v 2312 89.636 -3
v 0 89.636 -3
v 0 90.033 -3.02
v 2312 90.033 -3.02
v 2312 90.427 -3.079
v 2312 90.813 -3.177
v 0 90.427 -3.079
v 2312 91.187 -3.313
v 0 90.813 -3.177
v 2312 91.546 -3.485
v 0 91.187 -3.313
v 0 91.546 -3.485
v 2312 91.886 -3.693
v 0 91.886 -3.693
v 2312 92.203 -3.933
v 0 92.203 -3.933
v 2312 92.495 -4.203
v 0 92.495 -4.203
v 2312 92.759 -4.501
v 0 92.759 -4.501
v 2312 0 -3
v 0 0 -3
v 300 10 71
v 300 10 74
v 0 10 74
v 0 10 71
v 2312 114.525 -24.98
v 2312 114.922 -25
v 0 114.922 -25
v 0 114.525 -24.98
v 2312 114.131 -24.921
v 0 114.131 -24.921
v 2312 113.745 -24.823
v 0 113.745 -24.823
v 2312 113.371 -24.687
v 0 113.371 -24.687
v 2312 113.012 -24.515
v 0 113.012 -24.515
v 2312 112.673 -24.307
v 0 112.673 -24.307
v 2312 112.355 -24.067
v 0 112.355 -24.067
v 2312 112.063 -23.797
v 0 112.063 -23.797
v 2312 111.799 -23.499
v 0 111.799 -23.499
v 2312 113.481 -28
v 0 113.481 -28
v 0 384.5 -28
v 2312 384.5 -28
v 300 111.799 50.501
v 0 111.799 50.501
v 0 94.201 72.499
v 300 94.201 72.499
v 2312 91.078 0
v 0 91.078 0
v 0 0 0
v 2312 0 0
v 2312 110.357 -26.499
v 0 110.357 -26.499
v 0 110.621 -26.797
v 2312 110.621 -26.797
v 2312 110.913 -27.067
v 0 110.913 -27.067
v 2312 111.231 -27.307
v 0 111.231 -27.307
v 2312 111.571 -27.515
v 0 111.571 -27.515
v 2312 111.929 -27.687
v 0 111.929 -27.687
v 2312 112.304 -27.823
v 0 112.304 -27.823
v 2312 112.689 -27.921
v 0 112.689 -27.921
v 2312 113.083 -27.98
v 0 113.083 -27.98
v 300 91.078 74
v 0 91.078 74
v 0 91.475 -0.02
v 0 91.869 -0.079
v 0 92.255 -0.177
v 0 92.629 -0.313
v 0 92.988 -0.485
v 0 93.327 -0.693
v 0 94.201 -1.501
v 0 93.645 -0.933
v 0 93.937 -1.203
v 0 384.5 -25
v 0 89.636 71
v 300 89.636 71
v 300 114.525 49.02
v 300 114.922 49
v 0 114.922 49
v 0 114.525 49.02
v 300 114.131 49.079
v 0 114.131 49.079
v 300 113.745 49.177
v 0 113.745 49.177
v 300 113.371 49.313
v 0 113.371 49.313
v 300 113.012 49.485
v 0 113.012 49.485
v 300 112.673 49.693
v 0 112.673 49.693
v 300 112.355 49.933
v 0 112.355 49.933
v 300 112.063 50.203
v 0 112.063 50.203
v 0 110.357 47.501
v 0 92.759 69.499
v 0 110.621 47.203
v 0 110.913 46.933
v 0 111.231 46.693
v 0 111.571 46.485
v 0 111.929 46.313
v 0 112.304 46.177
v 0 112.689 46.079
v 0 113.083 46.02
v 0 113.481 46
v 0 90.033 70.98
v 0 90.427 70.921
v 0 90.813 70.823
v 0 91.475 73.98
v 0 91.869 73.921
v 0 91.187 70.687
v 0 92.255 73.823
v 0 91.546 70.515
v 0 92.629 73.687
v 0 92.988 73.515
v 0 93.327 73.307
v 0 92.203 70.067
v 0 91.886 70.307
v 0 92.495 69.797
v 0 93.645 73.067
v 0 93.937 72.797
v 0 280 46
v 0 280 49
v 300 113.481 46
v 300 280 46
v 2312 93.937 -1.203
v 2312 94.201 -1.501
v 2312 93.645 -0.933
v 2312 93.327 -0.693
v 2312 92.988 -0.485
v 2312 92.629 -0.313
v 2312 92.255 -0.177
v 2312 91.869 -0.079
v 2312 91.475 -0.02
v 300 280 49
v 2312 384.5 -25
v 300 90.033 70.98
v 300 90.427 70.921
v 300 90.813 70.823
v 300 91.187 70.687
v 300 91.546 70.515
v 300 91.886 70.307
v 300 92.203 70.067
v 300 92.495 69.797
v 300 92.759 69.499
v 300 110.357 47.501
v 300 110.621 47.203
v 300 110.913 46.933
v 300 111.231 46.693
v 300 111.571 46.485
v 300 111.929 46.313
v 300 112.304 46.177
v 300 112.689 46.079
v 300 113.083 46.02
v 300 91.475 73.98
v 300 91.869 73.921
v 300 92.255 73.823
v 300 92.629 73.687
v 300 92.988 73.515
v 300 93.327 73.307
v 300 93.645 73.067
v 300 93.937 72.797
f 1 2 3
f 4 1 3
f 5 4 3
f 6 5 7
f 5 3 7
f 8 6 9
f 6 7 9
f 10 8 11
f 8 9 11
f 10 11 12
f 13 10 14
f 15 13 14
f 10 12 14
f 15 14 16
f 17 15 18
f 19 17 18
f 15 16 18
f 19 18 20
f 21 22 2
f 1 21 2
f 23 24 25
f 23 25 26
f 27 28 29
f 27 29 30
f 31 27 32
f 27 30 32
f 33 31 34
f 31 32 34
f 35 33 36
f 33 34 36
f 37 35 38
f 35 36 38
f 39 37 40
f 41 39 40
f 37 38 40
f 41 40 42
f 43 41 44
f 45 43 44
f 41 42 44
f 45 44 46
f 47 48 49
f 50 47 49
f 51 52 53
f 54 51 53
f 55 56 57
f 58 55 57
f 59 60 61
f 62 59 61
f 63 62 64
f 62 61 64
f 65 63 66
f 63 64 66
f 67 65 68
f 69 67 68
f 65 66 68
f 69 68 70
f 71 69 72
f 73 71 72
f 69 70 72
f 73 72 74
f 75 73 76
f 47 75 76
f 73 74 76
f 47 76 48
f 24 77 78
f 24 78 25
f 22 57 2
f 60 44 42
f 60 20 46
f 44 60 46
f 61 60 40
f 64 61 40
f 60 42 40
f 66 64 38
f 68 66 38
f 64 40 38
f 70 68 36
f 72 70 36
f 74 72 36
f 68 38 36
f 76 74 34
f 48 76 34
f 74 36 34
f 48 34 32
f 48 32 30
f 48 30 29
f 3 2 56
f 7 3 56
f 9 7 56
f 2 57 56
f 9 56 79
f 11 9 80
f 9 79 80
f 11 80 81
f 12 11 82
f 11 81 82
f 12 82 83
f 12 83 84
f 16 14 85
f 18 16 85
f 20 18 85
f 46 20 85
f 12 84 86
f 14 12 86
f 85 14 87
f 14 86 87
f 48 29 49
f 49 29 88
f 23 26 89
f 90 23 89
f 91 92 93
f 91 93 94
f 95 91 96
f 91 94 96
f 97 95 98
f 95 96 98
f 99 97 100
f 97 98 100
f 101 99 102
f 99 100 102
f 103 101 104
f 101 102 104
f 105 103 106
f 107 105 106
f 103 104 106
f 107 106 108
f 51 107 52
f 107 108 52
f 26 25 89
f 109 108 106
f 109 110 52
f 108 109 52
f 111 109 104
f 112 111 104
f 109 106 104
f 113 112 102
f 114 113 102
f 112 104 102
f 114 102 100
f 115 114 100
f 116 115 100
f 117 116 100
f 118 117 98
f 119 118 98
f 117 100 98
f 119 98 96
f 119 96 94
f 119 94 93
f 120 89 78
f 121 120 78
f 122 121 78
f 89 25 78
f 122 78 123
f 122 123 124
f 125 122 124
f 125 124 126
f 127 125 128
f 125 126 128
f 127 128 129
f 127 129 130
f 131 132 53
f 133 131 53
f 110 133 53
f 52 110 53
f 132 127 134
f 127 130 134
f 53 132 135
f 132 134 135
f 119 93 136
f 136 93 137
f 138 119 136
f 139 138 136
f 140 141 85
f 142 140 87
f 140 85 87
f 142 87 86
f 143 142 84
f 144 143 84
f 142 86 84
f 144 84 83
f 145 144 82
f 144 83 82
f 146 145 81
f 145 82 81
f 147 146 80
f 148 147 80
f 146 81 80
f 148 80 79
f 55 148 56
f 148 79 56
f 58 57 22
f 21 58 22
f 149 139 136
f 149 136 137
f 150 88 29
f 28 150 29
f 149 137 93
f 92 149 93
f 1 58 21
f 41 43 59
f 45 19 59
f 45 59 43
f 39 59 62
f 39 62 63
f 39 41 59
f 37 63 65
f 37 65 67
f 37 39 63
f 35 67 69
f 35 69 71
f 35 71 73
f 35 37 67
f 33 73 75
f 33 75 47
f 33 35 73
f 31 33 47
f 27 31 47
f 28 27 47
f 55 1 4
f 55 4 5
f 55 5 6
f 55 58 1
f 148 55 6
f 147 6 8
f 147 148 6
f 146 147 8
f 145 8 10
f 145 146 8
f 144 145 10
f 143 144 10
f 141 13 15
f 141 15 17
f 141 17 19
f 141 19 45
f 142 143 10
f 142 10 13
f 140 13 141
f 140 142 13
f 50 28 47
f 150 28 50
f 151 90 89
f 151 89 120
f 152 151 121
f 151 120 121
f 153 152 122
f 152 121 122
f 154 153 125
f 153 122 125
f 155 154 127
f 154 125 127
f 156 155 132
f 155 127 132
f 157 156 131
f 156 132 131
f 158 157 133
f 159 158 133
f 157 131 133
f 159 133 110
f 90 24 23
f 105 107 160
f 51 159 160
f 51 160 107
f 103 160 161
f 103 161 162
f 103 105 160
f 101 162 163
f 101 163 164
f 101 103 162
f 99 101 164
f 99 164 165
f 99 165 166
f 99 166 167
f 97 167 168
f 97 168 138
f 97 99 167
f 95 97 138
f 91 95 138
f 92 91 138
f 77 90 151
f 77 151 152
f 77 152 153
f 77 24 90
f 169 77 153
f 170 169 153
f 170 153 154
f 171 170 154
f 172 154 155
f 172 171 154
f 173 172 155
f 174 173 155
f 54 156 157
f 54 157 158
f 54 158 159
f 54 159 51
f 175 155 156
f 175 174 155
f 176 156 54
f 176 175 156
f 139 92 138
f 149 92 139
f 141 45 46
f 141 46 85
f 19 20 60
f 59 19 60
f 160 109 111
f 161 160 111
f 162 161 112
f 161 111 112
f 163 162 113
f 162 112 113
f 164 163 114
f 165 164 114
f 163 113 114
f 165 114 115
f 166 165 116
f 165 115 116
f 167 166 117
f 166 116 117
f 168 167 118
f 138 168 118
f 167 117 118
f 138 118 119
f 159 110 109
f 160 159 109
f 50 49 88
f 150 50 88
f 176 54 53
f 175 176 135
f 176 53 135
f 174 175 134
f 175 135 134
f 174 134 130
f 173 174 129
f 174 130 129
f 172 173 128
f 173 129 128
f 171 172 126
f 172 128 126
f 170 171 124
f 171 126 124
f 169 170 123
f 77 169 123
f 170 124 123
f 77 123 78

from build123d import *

# Parameters (mm, degrees)
F1_DEPTH = 2312
F3_DEPTH = 300


with BuildPart() as f1:
    # F0 (on Right) → F1 (new body)
    with BuildSketch(Plane.YZ):
        with BuildLine():
            Line((91.077501, 0), (0, 0))
            Line((0, 0), (0, -3))
            Line((0, -3), (89.635626, -3))
            ThreePointArc((89.635626, -3), (91.368381, -3.394787), (92.759101, -4.50122))
            Line((92.759101, -4.50122), (110.35715, -26.49878))
            ThreePointArc((110.35715, -26.49878), (111.74787, -27.605213), (113.480625, -28))
            Line((113.480625, -28), (384.5, -28))
            Line((384.5, -28), (384.5, -25))
            Line((384.5, -25), (114.922499, -25))
            ThreePointArc((114.922499, -25), (113.189744, -24.605213), (111.799024, -23.49878))
            Line((111.799024, -23.49878), (94.200976, -1.50122))
            ThreePointArc((94.200976, -1.50122), (92.810256, -0.394787), (91.077501, 0))
        make_face()
    extrude(amount=F1_DEPTH)


with BuildPart() as f3:
    # F2 (on Right) → F3 (new body)
    with BuildSketch(Plane.YZ):
        with BuildLine():
            Line((91.077501, 74.000002), (10, 74.000002))
            Line((10, 74.000002), (10, 71.000002))
            Line((10, 71.000002), (89.635626, 71.000002))
            ThreePointArc((89.635626, 71.000002), (91.368381, 70.605215), (92.759101, 69.498783))
            Line((92.759101, 69.498783), (110.35715, 47.501222))
            ThreePointArc((110.35715, 47.501222), (111.74787, 46.394789), (113.480625, 46.000002))
            Line((113.480625, 46.000002), (280, 46.000002))
            Line((280, 46.000002), (280, 49.000002))
            Line((280, 49.000002), (114.922499, 49.000002))
            ThreePointArc((114.922499, 49.000002), (113.189744, 49.394789), (111.799024, 50.501222))
            Line((111.799024, 50.501222), (94.200976, 72.498783))
            ThreePointArc((94.200976, 72.498783), (92.810256, 73.605215), (91.077501, 74.000002))
        make_face()
    extrude(amount=F3_DEPTH)


solid = Compound([f1.part, f3.part])
